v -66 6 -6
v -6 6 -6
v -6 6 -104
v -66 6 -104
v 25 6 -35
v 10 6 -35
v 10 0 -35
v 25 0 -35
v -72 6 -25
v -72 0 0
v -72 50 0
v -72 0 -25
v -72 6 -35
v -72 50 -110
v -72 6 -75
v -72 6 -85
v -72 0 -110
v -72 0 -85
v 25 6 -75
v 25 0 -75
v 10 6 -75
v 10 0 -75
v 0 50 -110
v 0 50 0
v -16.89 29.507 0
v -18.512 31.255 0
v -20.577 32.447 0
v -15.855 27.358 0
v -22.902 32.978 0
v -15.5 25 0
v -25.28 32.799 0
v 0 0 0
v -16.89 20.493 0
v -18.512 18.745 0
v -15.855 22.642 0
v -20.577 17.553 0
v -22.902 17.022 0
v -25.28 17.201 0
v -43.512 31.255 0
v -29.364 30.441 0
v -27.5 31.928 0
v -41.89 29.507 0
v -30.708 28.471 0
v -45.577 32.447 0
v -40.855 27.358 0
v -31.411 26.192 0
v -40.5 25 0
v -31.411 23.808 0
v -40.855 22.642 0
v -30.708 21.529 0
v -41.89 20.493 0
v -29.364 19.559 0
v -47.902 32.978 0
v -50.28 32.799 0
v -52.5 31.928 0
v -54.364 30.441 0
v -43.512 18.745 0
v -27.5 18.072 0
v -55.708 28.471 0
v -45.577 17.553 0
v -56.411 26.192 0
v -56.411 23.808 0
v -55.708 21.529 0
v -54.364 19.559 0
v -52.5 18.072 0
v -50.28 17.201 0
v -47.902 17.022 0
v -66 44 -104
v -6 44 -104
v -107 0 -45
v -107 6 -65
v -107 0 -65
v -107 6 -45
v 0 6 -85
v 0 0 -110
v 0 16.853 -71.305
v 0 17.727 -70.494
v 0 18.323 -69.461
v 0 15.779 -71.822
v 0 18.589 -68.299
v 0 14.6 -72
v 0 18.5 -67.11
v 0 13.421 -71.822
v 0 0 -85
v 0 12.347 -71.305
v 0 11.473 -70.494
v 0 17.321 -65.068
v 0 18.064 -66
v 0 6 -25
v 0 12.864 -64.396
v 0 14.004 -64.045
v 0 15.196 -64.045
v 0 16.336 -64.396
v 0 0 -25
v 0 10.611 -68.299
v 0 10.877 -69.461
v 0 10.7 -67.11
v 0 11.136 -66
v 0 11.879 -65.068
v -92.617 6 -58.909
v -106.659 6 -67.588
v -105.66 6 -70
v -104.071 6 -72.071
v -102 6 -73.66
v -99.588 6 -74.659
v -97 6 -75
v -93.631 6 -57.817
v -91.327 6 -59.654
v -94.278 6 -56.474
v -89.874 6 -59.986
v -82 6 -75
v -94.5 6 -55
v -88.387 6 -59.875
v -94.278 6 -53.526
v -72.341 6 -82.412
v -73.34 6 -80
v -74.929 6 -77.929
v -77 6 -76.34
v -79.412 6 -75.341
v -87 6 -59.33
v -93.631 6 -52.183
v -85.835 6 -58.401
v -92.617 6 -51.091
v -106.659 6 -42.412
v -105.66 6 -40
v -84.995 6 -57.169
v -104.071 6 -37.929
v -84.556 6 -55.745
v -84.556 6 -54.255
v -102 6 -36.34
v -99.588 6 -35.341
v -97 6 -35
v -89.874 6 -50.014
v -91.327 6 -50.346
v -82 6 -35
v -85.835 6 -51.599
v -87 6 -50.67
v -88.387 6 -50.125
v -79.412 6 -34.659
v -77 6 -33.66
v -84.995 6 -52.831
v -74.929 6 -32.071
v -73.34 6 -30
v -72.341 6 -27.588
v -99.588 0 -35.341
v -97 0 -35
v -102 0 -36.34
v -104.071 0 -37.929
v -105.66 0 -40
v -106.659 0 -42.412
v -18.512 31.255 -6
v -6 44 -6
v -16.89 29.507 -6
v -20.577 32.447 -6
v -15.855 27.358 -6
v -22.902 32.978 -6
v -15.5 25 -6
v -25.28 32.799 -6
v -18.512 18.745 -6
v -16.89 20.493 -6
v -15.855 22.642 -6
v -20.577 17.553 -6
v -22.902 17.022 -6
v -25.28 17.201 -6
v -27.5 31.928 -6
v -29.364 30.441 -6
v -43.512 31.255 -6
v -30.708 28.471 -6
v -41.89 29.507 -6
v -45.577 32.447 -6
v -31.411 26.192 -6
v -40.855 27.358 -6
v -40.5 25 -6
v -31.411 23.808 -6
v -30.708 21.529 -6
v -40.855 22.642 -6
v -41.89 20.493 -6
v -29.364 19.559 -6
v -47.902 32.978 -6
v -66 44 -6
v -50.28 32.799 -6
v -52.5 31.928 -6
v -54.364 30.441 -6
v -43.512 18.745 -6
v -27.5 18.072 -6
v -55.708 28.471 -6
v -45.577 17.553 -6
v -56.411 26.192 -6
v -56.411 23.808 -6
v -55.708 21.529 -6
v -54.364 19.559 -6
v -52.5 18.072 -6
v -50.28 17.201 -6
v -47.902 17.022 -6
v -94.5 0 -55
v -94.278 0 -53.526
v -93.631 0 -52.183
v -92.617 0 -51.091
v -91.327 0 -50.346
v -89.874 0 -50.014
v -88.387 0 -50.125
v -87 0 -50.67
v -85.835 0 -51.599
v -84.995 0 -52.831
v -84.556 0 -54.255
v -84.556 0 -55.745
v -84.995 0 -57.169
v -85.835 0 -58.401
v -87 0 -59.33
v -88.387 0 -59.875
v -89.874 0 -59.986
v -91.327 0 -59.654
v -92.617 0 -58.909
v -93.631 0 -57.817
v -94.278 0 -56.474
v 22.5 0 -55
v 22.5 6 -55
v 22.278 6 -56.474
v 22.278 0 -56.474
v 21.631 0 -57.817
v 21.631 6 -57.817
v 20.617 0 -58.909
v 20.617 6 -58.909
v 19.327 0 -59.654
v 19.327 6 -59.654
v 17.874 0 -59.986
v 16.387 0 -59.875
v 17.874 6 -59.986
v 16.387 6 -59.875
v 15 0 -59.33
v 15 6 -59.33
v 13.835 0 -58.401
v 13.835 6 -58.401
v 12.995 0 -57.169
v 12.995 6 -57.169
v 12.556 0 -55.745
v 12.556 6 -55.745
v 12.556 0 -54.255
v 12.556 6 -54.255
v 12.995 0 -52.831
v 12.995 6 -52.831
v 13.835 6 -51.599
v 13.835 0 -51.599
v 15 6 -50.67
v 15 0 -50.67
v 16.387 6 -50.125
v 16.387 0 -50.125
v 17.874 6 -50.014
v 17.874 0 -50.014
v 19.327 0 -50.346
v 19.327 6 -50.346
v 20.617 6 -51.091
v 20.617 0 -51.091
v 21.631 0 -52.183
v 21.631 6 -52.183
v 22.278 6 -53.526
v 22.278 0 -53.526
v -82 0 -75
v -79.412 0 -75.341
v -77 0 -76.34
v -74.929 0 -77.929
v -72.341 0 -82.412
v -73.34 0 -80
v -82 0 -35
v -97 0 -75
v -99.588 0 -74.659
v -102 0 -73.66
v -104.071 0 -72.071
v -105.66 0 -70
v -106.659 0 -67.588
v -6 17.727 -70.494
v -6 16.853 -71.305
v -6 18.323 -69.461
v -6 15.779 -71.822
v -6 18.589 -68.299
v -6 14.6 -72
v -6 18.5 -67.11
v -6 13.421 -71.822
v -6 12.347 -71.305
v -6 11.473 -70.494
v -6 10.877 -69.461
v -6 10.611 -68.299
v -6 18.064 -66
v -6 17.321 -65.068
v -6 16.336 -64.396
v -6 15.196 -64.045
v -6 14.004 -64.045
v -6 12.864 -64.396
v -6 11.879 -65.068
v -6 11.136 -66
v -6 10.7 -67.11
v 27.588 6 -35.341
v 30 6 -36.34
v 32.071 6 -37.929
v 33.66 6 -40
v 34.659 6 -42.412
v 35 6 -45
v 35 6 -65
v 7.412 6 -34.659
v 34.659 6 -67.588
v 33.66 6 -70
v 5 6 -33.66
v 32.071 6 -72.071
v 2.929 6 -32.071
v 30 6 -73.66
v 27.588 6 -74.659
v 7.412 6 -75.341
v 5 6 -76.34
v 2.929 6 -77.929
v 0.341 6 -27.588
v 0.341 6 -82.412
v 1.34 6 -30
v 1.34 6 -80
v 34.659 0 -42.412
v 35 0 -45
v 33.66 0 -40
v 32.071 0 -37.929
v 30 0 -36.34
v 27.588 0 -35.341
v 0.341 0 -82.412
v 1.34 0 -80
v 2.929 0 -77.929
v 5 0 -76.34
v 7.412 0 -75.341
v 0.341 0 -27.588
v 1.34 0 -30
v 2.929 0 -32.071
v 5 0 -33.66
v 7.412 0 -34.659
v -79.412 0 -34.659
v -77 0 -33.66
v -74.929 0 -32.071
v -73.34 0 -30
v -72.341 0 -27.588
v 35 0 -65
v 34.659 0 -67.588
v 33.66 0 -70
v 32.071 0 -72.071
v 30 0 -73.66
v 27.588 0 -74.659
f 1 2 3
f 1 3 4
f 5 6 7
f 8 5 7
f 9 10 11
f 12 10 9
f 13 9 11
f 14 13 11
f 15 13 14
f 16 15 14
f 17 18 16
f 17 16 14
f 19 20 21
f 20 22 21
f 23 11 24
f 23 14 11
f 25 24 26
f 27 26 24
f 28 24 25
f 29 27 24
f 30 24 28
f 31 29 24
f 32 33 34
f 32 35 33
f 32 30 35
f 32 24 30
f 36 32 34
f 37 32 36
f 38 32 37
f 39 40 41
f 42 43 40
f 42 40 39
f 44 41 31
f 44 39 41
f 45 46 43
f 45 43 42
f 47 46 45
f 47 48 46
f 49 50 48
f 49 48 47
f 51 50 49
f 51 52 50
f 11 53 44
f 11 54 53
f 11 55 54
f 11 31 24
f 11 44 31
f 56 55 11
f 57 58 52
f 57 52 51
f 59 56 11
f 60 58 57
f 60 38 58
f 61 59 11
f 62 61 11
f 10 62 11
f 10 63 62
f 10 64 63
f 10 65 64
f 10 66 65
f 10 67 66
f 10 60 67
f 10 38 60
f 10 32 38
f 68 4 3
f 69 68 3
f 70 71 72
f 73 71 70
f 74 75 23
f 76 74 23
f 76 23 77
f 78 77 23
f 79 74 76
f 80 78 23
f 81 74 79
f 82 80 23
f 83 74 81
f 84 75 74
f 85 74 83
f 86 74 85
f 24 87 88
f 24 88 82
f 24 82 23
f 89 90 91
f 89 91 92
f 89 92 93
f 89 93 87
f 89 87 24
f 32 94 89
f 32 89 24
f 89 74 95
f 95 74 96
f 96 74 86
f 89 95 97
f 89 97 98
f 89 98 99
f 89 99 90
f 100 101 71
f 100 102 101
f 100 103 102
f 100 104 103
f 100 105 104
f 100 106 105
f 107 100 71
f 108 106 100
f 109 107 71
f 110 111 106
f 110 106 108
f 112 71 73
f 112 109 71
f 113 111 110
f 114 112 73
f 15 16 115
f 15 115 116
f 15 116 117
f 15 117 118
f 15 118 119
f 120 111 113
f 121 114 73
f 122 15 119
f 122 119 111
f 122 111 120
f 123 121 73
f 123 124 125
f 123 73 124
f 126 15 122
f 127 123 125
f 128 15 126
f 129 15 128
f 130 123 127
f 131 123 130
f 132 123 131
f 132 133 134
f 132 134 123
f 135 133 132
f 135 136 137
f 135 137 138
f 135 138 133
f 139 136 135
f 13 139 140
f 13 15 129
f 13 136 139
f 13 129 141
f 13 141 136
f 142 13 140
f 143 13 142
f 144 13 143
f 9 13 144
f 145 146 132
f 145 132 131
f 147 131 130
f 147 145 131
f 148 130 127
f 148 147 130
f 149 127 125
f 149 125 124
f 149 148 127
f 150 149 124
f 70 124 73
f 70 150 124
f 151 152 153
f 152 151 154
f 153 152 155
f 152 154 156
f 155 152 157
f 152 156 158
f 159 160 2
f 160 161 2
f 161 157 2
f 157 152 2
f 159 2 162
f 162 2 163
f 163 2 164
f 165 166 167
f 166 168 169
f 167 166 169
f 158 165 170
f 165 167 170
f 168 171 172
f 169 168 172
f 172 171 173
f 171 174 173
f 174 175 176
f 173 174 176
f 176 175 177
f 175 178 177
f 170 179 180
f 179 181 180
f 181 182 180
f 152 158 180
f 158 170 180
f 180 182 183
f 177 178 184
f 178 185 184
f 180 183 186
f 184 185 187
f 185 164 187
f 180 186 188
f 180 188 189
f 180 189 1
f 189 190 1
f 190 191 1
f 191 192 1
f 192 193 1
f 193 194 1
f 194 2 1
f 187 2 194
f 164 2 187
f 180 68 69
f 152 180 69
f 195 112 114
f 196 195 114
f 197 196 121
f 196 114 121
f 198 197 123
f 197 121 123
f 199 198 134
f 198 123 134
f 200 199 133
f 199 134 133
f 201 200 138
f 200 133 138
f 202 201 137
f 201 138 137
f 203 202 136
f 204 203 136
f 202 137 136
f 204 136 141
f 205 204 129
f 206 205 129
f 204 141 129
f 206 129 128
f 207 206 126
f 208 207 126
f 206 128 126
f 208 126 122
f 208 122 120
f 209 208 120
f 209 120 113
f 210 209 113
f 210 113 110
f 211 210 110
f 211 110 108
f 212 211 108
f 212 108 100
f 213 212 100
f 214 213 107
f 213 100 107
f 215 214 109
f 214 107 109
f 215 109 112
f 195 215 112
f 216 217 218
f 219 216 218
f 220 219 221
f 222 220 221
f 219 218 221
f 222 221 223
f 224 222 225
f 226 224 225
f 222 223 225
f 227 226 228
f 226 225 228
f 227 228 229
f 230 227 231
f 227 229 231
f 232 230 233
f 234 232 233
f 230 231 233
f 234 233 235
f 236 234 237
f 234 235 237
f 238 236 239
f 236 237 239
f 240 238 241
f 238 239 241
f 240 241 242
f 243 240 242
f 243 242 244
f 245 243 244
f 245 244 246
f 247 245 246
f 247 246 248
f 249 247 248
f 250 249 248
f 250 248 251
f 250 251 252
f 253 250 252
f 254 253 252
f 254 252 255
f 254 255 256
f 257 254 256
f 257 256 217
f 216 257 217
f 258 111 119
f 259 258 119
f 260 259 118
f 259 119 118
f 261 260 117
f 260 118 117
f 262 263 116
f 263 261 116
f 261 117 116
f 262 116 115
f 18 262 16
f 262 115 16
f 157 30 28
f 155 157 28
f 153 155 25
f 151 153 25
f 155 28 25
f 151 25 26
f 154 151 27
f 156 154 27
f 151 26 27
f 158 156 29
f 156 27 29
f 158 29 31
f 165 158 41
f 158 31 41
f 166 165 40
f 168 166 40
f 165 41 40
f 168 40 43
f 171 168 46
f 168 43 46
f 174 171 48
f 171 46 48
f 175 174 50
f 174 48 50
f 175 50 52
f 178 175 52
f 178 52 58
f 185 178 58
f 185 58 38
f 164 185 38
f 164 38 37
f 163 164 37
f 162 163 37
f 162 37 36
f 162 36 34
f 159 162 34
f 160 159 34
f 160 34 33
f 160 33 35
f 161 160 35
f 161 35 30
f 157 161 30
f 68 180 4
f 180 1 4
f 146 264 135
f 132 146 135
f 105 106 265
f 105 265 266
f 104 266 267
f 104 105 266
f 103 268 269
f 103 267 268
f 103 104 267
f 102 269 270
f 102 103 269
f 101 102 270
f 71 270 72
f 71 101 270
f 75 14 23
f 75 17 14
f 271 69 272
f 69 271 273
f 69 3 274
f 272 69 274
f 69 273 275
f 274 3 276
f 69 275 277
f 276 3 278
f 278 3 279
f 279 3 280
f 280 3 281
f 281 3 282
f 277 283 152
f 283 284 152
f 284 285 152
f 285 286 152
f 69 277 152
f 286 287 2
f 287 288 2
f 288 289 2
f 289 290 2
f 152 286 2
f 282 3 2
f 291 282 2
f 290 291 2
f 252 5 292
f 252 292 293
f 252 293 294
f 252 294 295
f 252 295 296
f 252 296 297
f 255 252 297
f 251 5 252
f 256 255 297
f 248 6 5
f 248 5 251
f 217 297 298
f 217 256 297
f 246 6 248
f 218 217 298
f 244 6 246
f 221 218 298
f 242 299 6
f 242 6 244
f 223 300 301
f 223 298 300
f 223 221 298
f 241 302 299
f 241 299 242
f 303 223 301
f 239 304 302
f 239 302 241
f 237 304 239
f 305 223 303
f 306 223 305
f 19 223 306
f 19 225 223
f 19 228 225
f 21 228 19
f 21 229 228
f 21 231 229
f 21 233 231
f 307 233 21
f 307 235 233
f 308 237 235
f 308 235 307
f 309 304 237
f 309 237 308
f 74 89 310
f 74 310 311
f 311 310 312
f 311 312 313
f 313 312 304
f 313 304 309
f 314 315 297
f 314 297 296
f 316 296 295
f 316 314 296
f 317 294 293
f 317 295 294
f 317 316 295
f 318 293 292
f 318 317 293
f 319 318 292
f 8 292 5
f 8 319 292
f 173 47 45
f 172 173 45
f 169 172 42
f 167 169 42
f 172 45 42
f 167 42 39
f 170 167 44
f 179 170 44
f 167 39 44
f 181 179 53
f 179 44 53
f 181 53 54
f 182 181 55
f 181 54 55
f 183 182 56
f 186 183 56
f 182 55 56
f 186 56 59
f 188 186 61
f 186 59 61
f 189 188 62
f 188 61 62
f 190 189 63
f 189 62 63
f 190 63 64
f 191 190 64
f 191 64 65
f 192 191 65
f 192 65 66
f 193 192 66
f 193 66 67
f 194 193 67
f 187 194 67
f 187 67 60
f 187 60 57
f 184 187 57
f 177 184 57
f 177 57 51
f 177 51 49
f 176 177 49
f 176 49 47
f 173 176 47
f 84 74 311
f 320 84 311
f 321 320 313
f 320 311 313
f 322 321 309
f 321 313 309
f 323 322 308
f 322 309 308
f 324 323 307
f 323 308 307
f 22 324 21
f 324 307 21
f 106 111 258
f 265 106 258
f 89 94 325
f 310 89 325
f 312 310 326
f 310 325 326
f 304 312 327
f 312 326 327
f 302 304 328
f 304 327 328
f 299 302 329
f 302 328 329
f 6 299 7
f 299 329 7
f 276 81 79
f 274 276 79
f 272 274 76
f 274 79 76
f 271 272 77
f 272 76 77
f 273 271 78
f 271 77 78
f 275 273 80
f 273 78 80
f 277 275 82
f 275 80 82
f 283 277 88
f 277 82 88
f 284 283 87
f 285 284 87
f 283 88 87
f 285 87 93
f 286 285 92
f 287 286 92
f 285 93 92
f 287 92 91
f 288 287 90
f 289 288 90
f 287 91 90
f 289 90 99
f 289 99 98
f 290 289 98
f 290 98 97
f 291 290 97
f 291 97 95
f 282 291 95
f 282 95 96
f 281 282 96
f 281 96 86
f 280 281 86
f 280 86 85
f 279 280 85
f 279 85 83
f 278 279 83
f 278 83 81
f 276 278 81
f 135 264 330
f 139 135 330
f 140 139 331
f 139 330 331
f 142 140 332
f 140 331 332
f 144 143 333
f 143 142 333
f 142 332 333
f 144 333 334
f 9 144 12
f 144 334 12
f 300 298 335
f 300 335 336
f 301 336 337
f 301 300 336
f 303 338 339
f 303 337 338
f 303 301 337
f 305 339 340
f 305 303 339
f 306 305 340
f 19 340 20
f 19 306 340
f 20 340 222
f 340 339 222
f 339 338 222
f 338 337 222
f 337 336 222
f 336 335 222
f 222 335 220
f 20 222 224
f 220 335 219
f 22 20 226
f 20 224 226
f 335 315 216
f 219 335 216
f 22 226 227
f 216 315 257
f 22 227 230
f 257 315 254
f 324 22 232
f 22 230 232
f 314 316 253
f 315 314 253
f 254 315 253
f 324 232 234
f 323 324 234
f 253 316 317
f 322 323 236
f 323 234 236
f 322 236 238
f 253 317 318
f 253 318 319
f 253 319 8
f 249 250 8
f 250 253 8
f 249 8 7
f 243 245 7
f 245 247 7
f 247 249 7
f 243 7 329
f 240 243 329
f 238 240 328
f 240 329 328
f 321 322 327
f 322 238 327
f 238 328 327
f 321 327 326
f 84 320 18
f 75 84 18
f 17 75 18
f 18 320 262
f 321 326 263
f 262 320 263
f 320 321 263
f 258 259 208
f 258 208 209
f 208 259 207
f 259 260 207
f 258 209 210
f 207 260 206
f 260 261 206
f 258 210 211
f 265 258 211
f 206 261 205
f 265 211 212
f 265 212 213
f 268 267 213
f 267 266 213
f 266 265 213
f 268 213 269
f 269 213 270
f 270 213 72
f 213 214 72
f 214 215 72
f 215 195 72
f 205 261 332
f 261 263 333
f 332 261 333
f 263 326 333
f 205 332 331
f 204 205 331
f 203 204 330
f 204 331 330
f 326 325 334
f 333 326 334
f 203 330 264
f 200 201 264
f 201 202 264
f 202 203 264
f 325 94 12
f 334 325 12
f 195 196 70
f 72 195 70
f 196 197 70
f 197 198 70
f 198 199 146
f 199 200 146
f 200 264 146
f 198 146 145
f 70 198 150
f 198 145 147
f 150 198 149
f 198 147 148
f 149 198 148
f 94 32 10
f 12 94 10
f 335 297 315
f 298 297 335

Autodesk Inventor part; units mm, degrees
ref_plane "YZ Plane" through (0, 0, 0) normal (1, 0, 0) x (0, 1, 0)
ref_plane "XZ Plane" through (0, 0, 0) normal (0, 1, 0) x (-1, 0, 0)
ref_plane "XY Plane" through (0, 0, 0) normal (0, 0, 1) x (1, 0, 0)
sketch "Esboço1" plane through (0, 0, 0) normal (0, 1, 0) x (-1, 0, 0)
  line L0 (0, 0) -> (72, 0)
  line L1 (72, 0) -> (72, -110)
  line L2 (72, -110) -> (0, -110)
  line L3 (0, -110) -> (0, 0)
  dimension "d0" = 72
  dimension "d1" = 110
extrude "Extrusão1" add sketch "Esboço1" along normal blind 6
sketch "Esboço2" plane through (0, 6, 0) normal (0, 1, 0) x (1, 0, 0)
  line L0 (0, 110) -> (-72, 110) projected
  line L1 (-72, 110) -> (-72, 0) projected
  line L2 (-72, 0) -> (0, 0) projected
  line L3 (0, 0) -> (0, 110) projected
  line L4 (-66, 104) -> (-6, 104)
  line L5 (-6, 104) -> (-6, 6)
  line L6 (-6, 6) -> (-66, 6)
  line L7 (-66, 6) -> (-66, 104)
  dimension "d4" = 6
extrude "Extrusão2" add sketch "Esboço2" along normal blind 44
sketch "Esboço3" plane through (-72, 0, 0) normal (0, 0, 1) x (1, 0, 0)
  circle A0 centre (23.5, 25) radius 8
  circle A1 centre (48.5, 25) radius 8
  line L0 (0, 50) -> (72, 50) projected
  line L1 (0, 0) -> (0, 50) projected
  line L2 (23.5, 25) -> (48.5, 25) construction
  point P0 (72, 0)
  point P1 (0, 25)
  point P2 (36, 25)
  point P3 (36, 50)
  dimension "d8" = 16
  dimension "d9" = 25
extrude "Extrusão3" cut sketch "Esboço3" against normal up to surface (6 mm away)
sketch "Esboço4" plane through (0, 0, 0) normal (1, 0, 0) x (0, 0, -1)
  line L0 (22.03, 11.6) -> (28.37, 11.6) projected
  arc A0 (28.37, 11.6) -> (29.67, 12.9) centre (28.37, 12.9) ccw projected
  line L1 (29.67, 12.9) -> (29.67, 13.46) projected
  arc A1 (29.67, 13.46) -> (28.37, 14.76) centre (28.37, 13.46) ccw projected
  line L2 (22.03, 14.76) -> (28.37, 14.76) projected
  arc A2 (22.03, 14.76) -> (20.73, 13.46) centre (22.03, 13.46) ccw projected
  line L3 (20.73, 12.9) -> (20.73, 13.46) projected
  arc A3 (20.73, 12.9) -> (22.03, 11.6) centre (22.03, 12.9) ccw projected
  arc A4 (28.37, 11.9) -> (29.37, 12.9) centre (28.37, 12.9) ccw projected
  line L4 (28.37, 11.9) -> (22.03, 11.9) projected
  arc A5 (21.03, 12.9) -> (22.03, 11.9) centre (22.03, 12.9) ccw projected
  line L5 (21.03, 13.46) -> (21.03, 12.9) projected
  arc A6 (22.03, 14.46) -> (21.03, 13.46) centre (22.03, 13.46) ccw projected
  line L6 (22.03, 14.46) -> (28.37, 14.46) projected
  arc A7 (29.37, 13.46) -> (28.37, 14.46) centre (28.37, 13.46) ccw projected
  line L7 (29.37, 12.9) -> (29.37, 13.46) projected
  line L8 (37.8445, 11.75) -> (39.84, 11.75) projected
  arc A8 (37.6268, 11.8436) -> (37.8445, 11.75) centre (37.8445, 12.05) ccw projected
  line L9 (36.9823, 12.5234) -> (37.6268, 11.8436) projected
  arc A9 (36.9, 12.7298) -> (36.9823, 12.5234) centre (37.2, 12.7298) ccw projected
  line L10 (36.9, 14.05) -> (36.9, 12.7298) projected
  arc A10 (37.2, 14.35) -> (36.9, 14.05) centre (37.2, 14.05) ccw projected
  line L11 (42.8, 14.35) -> (37.2, 14.35) projected
  arc A11 (43.1, 14.05) -> (42.8, 14.35) centre (42.8, 14.05) ccw projected
  line L12 (43.1, 12.7298) -> (43.1, 14.05) projected
  arc A12 (43.0177, 12.5234) -> (43.1, 12.7298) centre (42.8, 12.7298) ccw projected
  line L13 (42.3732, 11.8436) -> (43.0177, 12.5234) projected
  arc A13 (42.1555, 11.75) -> (42.3732, 11.8436) centre (42.1555, 12.05) ccw projected
  line L14 (40.16, 11.75) -> (42.1555, 11.75) projected
  line L15 (40.16, 11.6) -> (40.16, 11.75) projected
  line L16 (42.1555, 11.6) -> (40.16, 11.6) projected
  arc A14 (42.1555, 11.6) -> (42.4821, 11.7404) centre (42.1555, 12.05) ccw projected
  line L17 (43.1266, 12.4202) -> (42.4821, 11.7404) projected
  arc A15 (43.1266, 12.4202) -> (43.25, 12.7298) centre (42.8, 12.7298) ccw projected
  line L18 (43.25, 14.05) -> (43.25, 12.7298) projected
  arc A16 (43.25, 14.05) -> (42.8, 14.5) centre (42.8, 14.05) ccw projected
  line L19 (37.2, 14.5) -> (42.8, 14.5) projected
  arc A17 (37.2, 14.5) -> (36.75, 14.05) centre (37.2, 14.05) ccw projected
  line L20 (36.75, 12.7298) -> (36.75, 14.05) projected
  arc A18 (36.75, 12.7298) -> (36.8734, 12.4202) centre (37.2, 12.7298) ccw projected
  line L21 (37.5179, 11.7404) -> (36.8734, 12.4202) projected
  arc A19 (37.5179, 11.7404) -> (37.8445, 11.6) centre (37.8445, 12.05) ccw projected
  line L22 (39.84, 11.6) -> (37.8445, 11.6) projected
  line L23 (39.84, 11.75) -> (39.84, 11.6) projected
  line L24 (51.3445, 11.75) -> (53.34, 11.75) projected
  arc A20 (51.1268, 11.8436) -> (51.3445, 11.75) centre (51.3445, 12.05) ccw projected
  line L25 (50.4823, 12.5234) -> (51.1268, 11.8436) projected
  arc A21 (50.4, 12.7298) -> (50.4823, 12.5234) centre (50.7, 12.7298) ccw projected
  line L26 (50.4, 14.05) -> (50.4, 12.7298) projected
  arc A22 (50.7, 14.35) -> (50.4, 14.05) centre (50.7, 14.05) ccw projected
  line L27 (56.3, 14.35) -> (50.7, 14.35) projected
  arc A23 (56.6, 14.05) -> (56.3, 14.35) centre (56.3, 14.05) ccw projected
  line L28 (56.6, 12.7298) -> (56.6, 14.05) projected
  arc A24 (56.5177, 12.5234) -> (56.6, 12.7298) centre (56.3, 12.7298) ccw projected
  line L29 (55.8732, 11.8436) -> (56.5177, 12.5234) projected
  arc A25 (55.6555, 11.75) -> (55.8732, 11.8436) centre (55.6555, 12.05) ccw projected
  line L30 (53.66, 11.75) -> (55.6555, 11.75) projected
  line L31 (53.66, 11.6) -> (53.66, 11.75) projected
  line L32 (55.6555, 11.6) -> (53.66, 11.6) projected
  arc A26 (55.6555, 11.6) -> (55.9821, 11.7404) centre (55.6555, 12.05) ccw projected
  line L33 (56.6266, 12.4202) -> (55.9821, 11.7404) projected
  arc A27 (56.6266, 12.4202) -> (56.75, 12.7298) centre (56.3, 12.7298) ccw projected
  line L34 (56.75, 14.05) -> (56.75, 12.7298) projected
  arc A28 (56.75, 14.05) -> (56.3, 14.5) centre (56.3, 14.05) ccw projected
  line L35 (50.7, 14.5) -> (56.3, 14.5) projected
  arc A29 (50.7, 14.5) -> (50.25, 14.05) centre (50.7, 14.05) ccw projected
  line L36 (50.25, 12.7298) -> (50.25, 14.05) projected
  arc A30 (50.25, 12.7298) -> (50.3734, 12.4202) centre (50.7, 12.7298) ccw projected
  line L37 (51.0179, 11.7404) -> (50.3734, 12.4202) projected
  arc A31 (51.0179, 11.7404) -> (51.3445, 11.6) centre (51.3445, 12.05) ccw projected
  line L38 (53.34, 11.6) -> (51.3445, 11.6) projected
  line L39 (53.34, 11.75) -> (53.34, 11.6) projected
  line L40 (64.5, 17.6) -> (64.5, 11.6) projected
  line L41 (68, 11.6) -> (64.5, 11.6) projected
  arc A32 (68, 17.6) -> (68, 11.6) centre (68, 14.6) ccw projected
  line L42 (68, 17.6) -> (64.5, 17.6) projected
  line L43 (71.5, 17.6) -> (68, 17.6) projected
  arc A33 (68, 11.6) -> (68, 17.6) centre (68, 14.6) ccw projected
  line L44 (71.5, 11.6) -> (68, 11.6) projected
  line L45 (71.5, 11.6) -> (71.5, 17.6) projected
  circle A34 centre (68, 14.6) radius 4
  point P0 (0, 0)
  dimension "d12" = 1
extrude "Extrusão4" cut sketch "Esboço4" against normal up to next contours A34 L42 A32 L41 L40 | L40 A34 | A34 L43 L42 | A33 A32 | L43 A34 L45 L44 A33 | L41 L44 A34 | A34 L45
sketch "Esboço6" plane through (0, 50, 0) normal (0, 1, 0) x (1, 0, 0)
  line L0 (-72, 110) -> (-72, 0) projected
  line L1 (-72, 0) -> (0, 0) projected
  line L2 (0, 0) -> (0, 110) projected
  line L3 (0, 110) -> (-72, 110) projected
  line L4 (-66, 104) -> (-6, 104) projected
  line L5 (-6, 104) -> (-6, 6) projected
  line L6 (-6, 6) -> (-66, 6) projected
  line L7 (-66, 6) -> (-66, 104) projected
extrude "Extrusão5" add sketch "Esboço6" against normal blind 6 contours L4 L5 L6 L7
sketch "Esboço7" plane through (0, 0, 0) normal (1, 0, 0) x (0, 0, -1)
  line L0 (0, 0) -> (110, 0) projected
  line L1 (6, 6) -> (104, 6) projected
  line L2 (35, 0) -> (75, 0)
  line L3 (75, 0) -> (75, 6)
  line L4 (75, 6) -> (35, 6)
  line L5 (35, 6) -> (35, 0)
  point P0 (55, 6)
  point P1 (35, 6)
  point P2 (75, 0)
  dimension "d17" = 40
extrude "Extrusão6" add sketch "Esboço7" along normal blind 35
fillet "Arredondamento1" radius 10 4 edges at (0, 3, -35) (0, 3, -75) (35, 3, -75) (35, 3, -35)
ref_plane "Plano de trabalho1" through (-36, 0, -110) normal (1, 0, 0) x (0, 0, -1)
sketch "Esboço8" plane through (0, 6, -25) normal (0, 1, 0) x (1, 0, 0)
  circle A0 centre (17.5, 30) radius 5
  arc A1 (25, 10) -> (35, 20) centre (25, 20) ccw projected
  line L0 (35, 40) -> (35, 20) projected
  arc A2 (35, 40) -> (25, 50) centre (25, 40) ccw projected
  line L1 (10, 50) -> (25, 50) projected
  arc A3 (0, 60) -> (10, 50) centre (10, 60) ccw projected
  line L2 (0, 0) -> (0, 60) projected
  arc A4 (10, 10) -> (0, 0) centre (10, 0) ccw projected
  line L3 (10, 10) -> (25, 10) projected
  point P0 (0, -25)
  point P1 (35, 30)
  point P2 (17.5, 50)
  dimension "d21" = 10
extrude "Extrusão7" cut sketch "Esboço8" against normal blind 35 contours A0
mirror "Espelhar2" about plane through (-36, 0, -110) normal (1, 0, 0) of "Extrusão6", "Extrusão7"
fillet "Arredondamento2" radius 10 4 edges at (-72, 3, -35) (-107, 3, -35) (-107, 3, -75) (-72, 3, -75)
properties part number "Prototipo"
